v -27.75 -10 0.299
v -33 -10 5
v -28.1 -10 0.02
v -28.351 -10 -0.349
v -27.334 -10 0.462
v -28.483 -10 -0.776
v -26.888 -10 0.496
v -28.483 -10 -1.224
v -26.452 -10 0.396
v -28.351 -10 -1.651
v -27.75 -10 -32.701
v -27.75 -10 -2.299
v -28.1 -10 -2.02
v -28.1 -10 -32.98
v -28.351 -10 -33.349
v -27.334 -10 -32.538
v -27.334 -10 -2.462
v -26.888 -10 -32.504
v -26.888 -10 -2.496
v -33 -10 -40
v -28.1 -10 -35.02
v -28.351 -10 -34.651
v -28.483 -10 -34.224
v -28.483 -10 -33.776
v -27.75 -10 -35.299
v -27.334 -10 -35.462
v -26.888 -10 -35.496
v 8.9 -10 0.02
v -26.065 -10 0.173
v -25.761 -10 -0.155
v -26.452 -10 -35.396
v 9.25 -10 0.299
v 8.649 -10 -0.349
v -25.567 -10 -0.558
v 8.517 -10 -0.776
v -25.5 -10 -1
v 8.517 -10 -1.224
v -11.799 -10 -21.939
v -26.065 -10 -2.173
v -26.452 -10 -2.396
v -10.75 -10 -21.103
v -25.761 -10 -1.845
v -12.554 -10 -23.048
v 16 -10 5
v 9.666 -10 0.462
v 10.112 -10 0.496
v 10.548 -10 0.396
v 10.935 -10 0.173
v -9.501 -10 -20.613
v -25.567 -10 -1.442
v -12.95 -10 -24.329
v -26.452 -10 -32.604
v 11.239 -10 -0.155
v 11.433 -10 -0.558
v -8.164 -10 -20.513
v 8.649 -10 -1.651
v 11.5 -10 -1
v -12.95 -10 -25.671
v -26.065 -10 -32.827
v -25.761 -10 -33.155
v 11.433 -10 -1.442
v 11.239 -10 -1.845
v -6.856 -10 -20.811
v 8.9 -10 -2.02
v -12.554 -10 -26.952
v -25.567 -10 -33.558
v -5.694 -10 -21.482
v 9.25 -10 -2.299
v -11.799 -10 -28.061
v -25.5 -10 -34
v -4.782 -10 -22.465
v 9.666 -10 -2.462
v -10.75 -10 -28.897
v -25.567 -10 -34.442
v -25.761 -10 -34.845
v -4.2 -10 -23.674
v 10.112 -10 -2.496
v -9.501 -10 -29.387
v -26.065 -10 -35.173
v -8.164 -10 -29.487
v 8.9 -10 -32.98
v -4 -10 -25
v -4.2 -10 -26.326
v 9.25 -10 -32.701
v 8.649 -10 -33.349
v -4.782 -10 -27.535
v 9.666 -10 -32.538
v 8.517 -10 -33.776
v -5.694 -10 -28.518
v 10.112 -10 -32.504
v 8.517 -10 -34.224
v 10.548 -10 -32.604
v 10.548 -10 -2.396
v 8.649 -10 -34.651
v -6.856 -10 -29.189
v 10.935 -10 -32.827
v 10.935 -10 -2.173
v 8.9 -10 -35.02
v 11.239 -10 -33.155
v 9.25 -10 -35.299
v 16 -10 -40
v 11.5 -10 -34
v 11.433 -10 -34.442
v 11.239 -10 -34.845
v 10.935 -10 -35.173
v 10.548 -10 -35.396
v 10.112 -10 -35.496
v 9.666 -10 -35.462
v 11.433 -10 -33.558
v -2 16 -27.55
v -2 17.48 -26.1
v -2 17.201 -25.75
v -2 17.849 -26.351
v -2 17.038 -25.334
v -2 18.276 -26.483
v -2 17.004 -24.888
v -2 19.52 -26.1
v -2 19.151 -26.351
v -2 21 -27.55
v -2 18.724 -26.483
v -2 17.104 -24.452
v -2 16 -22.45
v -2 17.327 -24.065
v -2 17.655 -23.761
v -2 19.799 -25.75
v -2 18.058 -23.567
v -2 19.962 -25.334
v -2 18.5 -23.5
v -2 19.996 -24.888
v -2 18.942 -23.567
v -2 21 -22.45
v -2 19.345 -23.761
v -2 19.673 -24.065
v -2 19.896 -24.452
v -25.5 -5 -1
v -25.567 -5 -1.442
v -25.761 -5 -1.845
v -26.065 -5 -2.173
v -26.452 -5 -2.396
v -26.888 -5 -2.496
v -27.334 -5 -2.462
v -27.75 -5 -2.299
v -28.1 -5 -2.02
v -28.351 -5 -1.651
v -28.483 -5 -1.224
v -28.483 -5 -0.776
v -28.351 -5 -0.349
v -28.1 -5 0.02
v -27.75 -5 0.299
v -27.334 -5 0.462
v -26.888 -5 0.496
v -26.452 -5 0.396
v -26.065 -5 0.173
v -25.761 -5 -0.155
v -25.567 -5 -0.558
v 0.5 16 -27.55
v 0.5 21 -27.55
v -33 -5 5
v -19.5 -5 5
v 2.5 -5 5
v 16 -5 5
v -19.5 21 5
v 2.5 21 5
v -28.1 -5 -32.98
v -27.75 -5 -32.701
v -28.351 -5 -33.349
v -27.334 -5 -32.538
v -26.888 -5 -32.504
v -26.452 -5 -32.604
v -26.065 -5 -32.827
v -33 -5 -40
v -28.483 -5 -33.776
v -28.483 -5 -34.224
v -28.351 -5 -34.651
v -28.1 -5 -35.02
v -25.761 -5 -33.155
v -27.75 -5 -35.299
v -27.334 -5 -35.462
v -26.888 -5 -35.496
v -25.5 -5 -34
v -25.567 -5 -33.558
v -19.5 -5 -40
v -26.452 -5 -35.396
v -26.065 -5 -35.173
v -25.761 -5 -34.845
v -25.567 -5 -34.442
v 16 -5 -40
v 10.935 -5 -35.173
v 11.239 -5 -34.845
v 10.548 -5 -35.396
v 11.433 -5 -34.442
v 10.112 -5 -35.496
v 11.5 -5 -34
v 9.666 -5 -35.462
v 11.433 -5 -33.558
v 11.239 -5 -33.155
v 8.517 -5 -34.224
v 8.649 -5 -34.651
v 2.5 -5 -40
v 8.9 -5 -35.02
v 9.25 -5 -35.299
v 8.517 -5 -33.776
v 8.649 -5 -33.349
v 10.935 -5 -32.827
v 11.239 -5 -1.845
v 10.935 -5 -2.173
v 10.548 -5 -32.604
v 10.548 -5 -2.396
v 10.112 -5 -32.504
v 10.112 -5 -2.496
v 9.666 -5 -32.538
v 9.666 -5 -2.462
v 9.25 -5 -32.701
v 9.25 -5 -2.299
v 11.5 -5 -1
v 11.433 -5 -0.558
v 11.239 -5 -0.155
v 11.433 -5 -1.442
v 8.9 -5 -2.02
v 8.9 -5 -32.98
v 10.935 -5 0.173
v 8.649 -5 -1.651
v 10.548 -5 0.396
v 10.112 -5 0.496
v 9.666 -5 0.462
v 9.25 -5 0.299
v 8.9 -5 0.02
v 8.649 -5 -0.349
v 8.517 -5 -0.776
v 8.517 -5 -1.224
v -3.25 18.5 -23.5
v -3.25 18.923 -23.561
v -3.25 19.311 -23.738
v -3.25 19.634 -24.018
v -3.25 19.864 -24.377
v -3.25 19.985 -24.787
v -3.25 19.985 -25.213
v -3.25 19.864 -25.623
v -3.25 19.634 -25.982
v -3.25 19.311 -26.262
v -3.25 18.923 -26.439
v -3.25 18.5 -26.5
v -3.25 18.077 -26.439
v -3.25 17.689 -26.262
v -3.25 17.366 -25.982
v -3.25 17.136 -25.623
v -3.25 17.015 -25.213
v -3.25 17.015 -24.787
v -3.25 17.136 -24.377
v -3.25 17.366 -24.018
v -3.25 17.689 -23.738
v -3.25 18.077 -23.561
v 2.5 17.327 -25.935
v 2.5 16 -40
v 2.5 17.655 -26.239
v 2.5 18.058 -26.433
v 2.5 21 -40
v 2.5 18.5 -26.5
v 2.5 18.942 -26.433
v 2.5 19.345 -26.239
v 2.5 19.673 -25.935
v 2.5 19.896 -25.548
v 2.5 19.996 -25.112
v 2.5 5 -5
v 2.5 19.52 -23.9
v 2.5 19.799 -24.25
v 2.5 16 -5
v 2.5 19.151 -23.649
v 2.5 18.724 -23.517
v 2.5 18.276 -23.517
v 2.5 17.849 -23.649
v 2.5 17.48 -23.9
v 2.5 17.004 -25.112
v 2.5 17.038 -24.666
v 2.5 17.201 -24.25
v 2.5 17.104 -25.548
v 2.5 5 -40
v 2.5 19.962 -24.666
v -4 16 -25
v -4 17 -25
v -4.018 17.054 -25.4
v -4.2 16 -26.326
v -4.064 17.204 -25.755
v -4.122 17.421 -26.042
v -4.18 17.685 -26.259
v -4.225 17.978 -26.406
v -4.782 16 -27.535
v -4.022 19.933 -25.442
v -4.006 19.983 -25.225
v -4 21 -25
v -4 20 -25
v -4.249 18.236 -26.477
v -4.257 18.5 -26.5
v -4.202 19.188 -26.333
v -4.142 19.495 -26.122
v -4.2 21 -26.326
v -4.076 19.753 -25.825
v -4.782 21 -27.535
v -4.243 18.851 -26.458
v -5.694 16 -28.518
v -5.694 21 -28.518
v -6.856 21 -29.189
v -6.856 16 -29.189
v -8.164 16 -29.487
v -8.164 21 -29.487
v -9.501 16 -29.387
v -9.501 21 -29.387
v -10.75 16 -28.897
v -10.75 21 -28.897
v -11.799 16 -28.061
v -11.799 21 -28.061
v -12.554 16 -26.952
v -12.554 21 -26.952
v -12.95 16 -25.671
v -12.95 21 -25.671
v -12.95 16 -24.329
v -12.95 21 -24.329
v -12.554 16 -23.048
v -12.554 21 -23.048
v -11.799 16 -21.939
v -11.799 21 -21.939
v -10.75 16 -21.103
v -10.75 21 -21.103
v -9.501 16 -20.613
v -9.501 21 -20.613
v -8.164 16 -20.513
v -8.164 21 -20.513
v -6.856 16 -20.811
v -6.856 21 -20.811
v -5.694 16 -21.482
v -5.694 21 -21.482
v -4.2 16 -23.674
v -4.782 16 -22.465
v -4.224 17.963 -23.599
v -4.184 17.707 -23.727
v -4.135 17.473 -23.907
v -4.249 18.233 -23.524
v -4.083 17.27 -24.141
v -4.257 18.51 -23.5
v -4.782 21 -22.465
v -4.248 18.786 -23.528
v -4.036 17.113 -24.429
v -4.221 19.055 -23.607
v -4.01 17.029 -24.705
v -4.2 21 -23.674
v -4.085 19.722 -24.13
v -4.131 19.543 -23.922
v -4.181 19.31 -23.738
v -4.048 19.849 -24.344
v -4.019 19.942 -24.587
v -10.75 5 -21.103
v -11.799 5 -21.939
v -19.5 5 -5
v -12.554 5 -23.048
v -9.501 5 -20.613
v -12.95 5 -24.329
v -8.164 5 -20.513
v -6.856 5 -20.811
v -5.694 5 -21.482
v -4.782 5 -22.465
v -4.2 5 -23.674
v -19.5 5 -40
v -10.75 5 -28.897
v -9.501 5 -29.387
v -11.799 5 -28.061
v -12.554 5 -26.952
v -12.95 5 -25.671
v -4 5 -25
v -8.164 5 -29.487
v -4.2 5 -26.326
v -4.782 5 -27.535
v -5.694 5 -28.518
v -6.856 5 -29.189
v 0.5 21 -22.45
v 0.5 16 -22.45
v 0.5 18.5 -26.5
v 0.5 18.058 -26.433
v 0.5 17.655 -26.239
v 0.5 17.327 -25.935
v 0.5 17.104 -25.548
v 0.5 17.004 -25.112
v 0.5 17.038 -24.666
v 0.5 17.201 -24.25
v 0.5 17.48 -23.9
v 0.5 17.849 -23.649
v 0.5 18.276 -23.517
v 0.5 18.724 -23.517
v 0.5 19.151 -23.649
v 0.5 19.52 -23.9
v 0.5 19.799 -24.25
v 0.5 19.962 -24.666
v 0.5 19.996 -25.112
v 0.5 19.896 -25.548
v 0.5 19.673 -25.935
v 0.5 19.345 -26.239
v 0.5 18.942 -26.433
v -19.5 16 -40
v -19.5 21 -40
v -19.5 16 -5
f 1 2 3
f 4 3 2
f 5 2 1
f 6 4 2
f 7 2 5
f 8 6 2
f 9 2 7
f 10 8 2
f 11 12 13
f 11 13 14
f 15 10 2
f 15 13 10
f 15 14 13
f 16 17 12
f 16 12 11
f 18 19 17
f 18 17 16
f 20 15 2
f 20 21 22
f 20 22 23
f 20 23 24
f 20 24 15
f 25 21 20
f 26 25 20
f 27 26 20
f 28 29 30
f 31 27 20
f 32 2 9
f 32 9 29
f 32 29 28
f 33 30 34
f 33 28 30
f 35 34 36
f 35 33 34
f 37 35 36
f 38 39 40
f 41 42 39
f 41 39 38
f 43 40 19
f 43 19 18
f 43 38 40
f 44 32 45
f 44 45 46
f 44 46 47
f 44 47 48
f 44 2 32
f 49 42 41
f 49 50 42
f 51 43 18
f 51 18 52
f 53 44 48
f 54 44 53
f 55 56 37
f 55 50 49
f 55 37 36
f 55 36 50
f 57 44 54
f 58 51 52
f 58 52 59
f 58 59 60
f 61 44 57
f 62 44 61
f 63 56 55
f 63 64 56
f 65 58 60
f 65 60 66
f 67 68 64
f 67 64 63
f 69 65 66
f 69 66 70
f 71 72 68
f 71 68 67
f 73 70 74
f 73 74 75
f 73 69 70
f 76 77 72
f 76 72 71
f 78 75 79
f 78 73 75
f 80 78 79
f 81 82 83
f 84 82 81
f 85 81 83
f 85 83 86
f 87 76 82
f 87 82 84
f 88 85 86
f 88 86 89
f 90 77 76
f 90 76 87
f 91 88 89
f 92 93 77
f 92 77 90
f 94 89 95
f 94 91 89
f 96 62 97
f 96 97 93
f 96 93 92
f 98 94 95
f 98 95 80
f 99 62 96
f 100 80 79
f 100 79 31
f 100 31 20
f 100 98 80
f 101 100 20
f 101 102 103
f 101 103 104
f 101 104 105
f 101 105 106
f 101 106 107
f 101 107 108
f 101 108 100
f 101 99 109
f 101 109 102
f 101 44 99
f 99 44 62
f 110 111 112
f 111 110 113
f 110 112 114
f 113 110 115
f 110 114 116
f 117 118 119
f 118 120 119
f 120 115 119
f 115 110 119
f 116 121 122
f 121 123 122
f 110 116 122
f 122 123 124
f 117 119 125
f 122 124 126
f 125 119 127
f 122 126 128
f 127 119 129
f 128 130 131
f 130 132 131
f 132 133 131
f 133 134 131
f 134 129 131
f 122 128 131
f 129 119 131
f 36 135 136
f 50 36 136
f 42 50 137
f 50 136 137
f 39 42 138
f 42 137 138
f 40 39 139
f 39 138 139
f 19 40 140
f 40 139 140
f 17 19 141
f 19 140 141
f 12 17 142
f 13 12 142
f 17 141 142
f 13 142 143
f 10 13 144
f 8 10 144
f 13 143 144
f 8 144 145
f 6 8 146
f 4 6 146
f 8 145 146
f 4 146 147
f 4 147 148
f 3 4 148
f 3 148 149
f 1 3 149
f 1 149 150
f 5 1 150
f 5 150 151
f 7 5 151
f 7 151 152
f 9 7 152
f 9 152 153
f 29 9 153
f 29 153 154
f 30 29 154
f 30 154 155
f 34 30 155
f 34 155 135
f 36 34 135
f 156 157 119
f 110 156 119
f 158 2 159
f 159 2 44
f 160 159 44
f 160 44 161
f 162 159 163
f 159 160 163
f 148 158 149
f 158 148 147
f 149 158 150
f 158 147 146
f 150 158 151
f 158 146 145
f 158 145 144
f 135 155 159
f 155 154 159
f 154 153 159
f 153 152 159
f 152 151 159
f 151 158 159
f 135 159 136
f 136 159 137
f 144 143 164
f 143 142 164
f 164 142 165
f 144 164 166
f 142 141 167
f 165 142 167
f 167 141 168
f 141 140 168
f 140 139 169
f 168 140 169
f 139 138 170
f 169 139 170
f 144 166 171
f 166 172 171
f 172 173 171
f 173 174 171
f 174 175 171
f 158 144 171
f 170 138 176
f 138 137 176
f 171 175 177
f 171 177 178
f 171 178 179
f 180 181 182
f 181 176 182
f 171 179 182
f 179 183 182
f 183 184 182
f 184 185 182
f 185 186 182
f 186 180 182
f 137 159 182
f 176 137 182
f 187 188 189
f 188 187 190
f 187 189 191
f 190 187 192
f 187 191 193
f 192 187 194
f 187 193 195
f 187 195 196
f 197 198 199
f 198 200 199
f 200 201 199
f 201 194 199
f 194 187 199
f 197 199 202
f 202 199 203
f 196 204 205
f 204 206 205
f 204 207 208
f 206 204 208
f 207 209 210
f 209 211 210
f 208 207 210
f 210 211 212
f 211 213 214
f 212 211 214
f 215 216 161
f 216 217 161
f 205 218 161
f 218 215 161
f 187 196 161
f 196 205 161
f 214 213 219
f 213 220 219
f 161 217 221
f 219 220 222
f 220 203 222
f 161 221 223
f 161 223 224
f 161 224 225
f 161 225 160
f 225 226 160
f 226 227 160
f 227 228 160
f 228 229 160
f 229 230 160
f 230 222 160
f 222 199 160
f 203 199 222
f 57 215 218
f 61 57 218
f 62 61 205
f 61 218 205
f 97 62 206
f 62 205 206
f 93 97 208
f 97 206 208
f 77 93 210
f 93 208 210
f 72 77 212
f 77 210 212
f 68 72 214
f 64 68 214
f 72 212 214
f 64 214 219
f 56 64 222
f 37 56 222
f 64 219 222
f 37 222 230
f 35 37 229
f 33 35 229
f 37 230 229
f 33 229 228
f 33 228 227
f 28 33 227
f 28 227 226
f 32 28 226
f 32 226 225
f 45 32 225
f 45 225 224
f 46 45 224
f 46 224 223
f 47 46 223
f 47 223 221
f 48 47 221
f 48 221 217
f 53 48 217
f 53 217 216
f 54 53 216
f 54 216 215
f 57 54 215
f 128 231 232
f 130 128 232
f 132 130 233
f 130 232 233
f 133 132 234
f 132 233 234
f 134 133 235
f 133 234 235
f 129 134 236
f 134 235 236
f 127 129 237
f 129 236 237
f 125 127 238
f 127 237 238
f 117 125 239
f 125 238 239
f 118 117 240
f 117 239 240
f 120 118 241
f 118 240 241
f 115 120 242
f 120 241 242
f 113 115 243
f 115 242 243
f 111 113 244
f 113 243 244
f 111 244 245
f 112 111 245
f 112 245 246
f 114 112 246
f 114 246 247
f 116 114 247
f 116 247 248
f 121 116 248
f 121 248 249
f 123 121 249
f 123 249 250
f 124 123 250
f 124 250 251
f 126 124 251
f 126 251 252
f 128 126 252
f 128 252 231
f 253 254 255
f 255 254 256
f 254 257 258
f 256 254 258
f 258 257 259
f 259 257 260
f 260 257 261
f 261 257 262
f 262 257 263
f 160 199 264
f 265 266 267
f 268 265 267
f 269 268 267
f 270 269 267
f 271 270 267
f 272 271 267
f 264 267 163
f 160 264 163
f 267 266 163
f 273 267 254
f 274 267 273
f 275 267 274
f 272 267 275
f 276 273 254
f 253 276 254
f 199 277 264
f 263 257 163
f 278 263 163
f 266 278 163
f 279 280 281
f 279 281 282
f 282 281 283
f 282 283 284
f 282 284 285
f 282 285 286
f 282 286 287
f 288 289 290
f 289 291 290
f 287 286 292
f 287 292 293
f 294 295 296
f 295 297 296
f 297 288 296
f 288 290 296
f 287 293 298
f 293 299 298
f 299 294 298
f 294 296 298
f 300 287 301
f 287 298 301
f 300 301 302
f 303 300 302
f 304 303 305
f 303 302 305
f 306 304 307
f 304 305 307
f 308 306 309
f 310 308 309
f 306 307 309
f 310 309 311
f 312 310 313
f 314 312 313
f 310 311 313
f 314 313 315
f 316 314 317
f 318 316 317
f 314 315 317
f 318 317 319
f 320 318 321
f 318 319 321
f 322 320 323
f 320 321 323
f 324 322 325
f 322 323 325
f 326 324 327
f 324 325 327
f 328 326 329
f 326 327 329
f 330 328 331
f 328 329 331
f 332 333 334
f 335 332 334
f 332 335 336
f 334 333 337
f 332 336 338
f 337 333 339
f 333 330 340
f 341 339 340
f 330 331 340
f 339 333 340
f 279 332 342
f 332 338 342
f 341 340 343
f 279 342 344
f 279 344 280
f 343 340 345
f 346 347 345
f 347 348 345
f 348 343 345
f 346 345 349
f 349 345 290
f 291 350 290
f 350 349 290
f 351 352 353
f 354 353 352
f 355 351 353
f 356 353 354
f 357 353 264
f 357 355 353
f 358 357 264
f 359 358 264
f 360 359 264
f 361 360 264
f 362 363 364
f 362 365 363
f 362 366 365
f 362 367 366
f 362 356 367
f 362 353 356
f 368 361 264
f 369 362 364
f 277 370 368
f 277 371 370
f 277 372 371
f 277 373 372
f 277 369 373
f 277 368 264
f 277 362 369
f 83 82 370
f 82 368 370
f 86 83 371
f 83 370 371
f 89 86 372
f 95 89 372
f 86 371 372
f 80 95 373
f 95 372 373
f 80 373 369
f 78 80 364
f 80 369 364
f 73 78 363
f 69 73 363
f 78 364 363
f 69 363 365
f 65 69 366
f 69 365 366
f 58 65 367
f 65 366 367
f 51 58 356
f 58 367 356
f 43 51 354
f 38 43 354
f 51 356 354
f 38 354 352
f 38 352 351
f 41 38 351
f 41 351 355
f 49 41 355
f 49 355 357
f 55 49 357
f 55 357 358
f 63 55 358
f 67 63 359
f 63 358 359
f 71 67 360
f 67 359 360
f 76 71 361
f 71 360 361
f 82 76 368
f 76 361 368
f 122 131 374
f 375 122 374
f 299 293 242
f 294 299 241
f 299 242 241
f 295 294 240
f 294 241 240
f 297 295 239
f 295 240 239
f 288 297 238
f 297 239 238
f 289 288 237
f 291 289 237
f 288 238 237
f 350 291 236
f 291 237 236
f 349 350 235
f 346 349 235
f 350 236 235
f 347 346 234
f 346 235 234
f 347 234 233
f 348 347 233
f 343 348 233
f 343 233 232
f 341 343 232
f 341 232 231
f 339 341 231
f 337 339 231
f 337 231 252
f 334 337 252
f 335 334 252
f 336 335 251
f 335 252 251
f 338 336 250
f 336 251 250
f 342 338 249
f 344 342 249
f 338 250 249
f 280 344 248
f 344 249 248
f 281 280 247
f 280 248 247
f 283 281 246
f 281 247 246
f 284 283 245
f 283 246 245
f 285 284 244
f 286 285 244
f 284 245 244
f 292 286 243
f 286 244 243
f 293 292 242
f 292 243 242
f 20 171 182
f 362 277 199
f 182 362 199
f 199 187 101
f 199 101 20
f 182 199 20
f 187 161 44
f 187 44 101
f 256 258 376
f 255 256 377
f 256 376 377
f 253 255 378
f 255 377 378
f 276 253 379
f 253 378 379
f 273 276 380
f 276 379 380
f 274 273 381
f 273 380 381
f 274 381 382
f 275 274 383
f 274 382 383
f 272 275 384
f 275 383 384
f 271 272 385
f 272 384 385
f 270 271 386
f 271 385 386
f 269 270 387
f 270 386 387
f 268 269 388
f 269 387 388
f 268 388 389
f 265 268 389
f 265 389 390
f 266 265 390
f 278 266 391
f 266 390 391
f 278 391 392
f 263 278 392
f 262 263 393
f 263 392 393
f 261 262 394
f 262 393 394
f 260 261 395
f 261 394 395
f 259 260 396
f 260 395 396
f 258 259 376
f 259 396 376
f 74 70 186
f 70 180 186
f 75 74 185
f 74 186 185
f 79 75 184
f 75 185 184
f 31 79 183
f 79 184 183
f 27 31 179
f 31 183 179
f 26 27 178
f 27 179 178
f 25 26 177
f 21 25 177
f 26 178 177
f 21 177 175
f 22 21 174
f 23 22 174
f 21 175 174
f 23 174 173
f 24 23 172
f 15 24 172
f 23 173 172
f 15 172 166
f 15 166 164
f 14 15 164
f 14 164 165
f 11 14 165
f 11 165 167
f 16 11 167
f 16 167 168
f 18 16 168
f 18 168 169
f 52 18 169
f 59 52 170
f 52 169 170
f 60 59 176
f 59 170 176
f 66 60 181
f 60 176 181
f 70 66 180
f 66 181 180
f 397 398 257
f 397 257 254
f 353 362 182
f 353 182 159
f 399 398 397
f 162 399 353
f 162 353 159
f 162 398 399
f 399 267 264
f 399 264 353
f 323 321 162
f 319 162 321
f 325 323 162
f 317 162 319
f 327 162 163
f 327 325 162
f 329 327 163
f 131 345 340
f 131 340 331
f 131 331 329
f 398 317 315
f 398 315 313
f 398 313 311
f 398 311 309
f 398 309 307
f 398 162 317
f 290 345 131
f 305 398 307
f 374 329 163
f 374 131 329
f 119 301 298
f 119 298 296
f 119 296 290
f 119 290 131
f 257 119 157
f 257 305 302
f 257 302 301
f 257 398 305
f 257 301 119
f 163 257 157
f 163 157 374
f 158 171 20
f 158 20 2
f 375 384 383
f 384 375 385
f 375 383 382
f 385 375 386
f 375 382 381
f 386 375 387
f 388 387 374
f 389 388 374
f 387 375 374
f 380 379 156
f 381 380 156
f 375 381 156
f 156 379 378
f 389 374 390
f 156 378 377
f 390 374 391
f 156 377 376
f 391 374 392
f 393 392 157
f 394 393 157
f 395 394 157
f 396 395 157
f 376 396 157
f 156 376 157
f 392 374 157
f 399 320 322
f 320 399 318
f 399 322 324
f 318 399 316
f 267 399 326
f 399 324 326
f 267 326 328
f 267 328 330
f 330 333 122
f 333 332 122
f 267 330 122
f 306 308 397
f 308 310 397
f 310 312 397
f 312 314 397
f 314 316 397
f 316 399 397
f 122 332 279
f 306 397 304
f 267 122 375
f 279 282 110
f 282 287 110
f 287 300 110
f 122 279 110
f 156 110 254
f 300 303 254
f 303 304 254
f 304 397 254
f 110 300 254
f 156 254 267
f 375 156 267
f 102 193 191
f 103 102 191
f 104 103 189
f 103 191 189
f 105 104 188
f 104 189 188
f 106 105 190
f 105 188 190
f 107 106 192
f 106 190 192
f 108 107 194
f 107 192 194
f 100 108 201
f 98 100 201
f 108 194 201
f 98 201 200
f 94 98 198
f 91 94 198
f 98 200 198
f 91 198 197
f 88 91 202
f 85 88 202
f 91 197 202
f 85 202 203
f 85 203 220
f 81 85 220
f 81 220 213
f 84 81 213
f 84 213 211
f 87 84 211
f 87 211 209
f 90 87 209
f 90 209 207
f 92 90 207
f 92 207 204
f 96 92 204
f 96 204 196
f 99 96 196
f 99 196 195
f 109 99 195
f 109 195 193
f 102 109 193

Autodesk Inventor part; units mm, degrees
ref_plane "YZ Plane" through (0, 0, 0) normal (1, 0, 0) x (0, 1, 0)
ref_plane "XZ Plane" through (0, 0, 0) normal (0, 1, 0) x (-1, 0, 0)
ref_plane "XY Plane" through (0, 0, 0) normal (0, 0, 1) x (1, 0, 0)
sketch "Skizze1" plane through (0, 0, 0) normal (0, 1, 0) x (-1, 0, 0)
  line L0 (0, 0) -> (17, 0)
  line L1 (17, 0) -> (17, -40)
  line L2 (17, -40) -> (0, -40)
  line L3 (0, -40) -> (0, 0)
  dimension "d0" = 17
  dimension "d1" = 40
extrude "Extrusion1" add sketch "Skizze1" along normal blind 5
sketch "Skizze2" plane through (0, 5, 0) normal (0, 1, 0) x (1, 0, 0)
  line L0 (-17, 0) -> (0, 0) projected
  line L1 (0, 0) -> (0, 40) projected
  line L2 (-17, 0) -> (0, 0)
  line L3 (0, 0) -> (0, 10)
  line L4 (0, 10) -> (-17, 10)
  line L5 (-17, 10) -> (-17, 0)
  dimension "d4" = 10
extrude "Extrusion2" add sketch "Skizze2" along normal blind 11
sketch "Skizze3" plane through (0, 16, 0) normal (0, 1, 0) x (1, 0, 0)
  line L0 (-17, 0) -> (0, 0) projected
  line L1 (0, 0) -> (0, 40) projected
  line L2 (-17, 0) -> (0, 0)
  line L3 (0, 0) -> (0, 40)
  line L4 (0, 40) -> (-17, 40)
  line L5 (-17, 40) -> (-17, 0)
  dimension "d7" = 17
  dimension "d8" = 40
extrude "Extrusion3" add sketch "Skizze3" along normal blind 5
sketch "Skizze4" plane through (0, 21, 0) normal (0, 1, 0) x (1, 0, 0)
  line L0 (0, 10) -> (0, 40) projected
  line L1 (0, 40) -> (-8.5, 40)
  line L2 (-8.5, 40) -> (-8.5, 25)
  line L3 (-8.5, 25) -> (0, 25)
  line L4 (0, 25) -> (0, 40)
  circle A0 centre (-8.5, 25) radius 4.5
  point P0 (0, 0)
  dimension "d11" = 8.5
  dimension "d12" = 15
  dimension "d13" = 9
extrude "Extrusion4" cut sketch "Skizze4" against normal blind 21 contours A0 L2 L3 | L3 L2 A0
sketch "Skizze5" plane through (0, 21, 0) normal (0, 1, 0) x (1, 0, 0)
  circle A0 centre (-8.5, 25) radius 4.5 projected
  line L0 (-8.5, 25) -> (0, 25)
  line L1 (0, 0) -> (0, 40) projected
  line L2 (0, 25) -> (-2, 25)
  line L3 (-2, 25) -> (-3.25, 25)
  line L4 (-3.25, 25) -> (-3.25, 27.55)
  line L5 (-3.25, 27.55) -> (-0.75, 27.55)
  line L6 (-0.75, 27.55) -> (-0.75, 22.45)
  line L7 (-0.75, 22.45) -> (-3.25, 22.45)
  line L8 (-3.25, 22.45) -> (-3.25, 25)
  dimension "d16" = 2
  dimension "d17" = 1.25
  dimension "d18" = 2.55
  dimension "d19" = 2.5
  dimension "d20" = 5.1
extrude "Extrusion5" cut sketch "Skizze5" against normal blind 5 contours L4 L5 L6 L0 | L0 L6 L7 L8
sketch "Skizze6" plane through (0, 5, 0) normal (0, 1, 0) x (1, 0, 0)
  point P0 (0, 0)
sketch "Skizze7" plane through (0, 21, 0) normal (0, 1, 0) x (1, 0, 0)
  point P0 (0, 0)
sketch "Skizze8" plane through (0, 0, 0) normal (1, 0, 0) x (0, 0, -1)
  line L0 (40, 16) -> (40, 21) projected
  line L1 (40, 20.3408) -> (25, 20.3408)
  line L2 (40, 20.3408) -> (55, 20.3408) construction
  line L3 (25, 20.3408) -> (25, 21)
  line L4 (27.55, 21) -> (22.45, 21) projected
  line L5 (25, 21) -> (25, 18.5)
  circle A0 centre (25, 18.5) radius 1.5
  point P0 (0, 0)
  dimension "d23" = 15
  dimension "d24" = 180
  dimension "d25" = 2.5
  dimension "d26" = 3
extrude "Extrusion6" cut sketch "Skizze8" against normal blind 10
sketch "Skizze9" plane through (0, 21, 0) normal (0, 1, 0) x (1, 0, 0)
  point P0 (0, 0)
sketch "Skizze10" plane through (0, 21, 0) normal (0, 1, 0) x (1, 0, 0)
  point P0 (0, 0)
sketch "Skizze11" plane through (0, 5, 0) normal (0, 1, 0) x (1, 0, 0)
  point P0 (0, 0)
sketch "Skizze12" plane through (-17, 0, -40) normal (-1, 0, 0) x (0, 0, 1)
  line L0 (40, 21) -> (0, 21) projected
  line L1 (40, 0) -> (0, 0) projected
  line L2 (40, 21) -> (30, 21)
  line L3 (30, 0) -> (40, 0)
  line L4 (40, 0) -> (40, 21)
  line L5 (30, 16) -> (0, 16) projected
  line L6 (30, 21) -> (0, 21)
  line L7 (0, 21) -> (0, 16)
  line L8 (0, 16) -> (30, 16)
  line L9 (30, 5) -> (30, 16) projected
  line L10 (30, 5) -> (0, 5)
  line L11 (0, 5) -> (0, 0)
  line L12 (0, 0) -> (30, 0)
  line L13 (30, 16) -> (30, 5)
  dimension "d29" = 10
extrude "Extrusion7" add sketch "Skizze12" along normal blind 2.5
sketch "Skizze13" plane through (0, 0, 0) normal (1, 0, 0) x (0, 0, -1)
  line L0 (0, 0) -> (40, 0) projected
  line L1 (10, 5) -> (40, 5) projected
  line L2 (40, 0) -> (10, 0)
  line L3 (10, 5) -> (40, 5)
  line L4 (40, 5) -> (40, 0)
  line L5 (0, 0) -> (0, 21) projected
  line L6 (10, 0) -> (0, 0)
  line L7 (0, 0) -> (0, 21)
  line L8 (0, 21) -> (10, 21)
  line L9 (10, 16) -> (40, 16) projected
  line L10 (40, 16) -> (10, 16)
  line L11 (10, 21) -> (40, 21)
  line L12 (40, 21) -> (40, 16)
  line L13 (10, 5) -> (10, 16) projected
  line L14 (10, 5) -> (10, 16)
  circle A0 centre (25, 18.5) radius 1.5 projected
  circle A1 centre (25, 18.5) radius 1.5
  dimension "d32" = 3
extrude "Extrusion8" add sketch "Skizze13" along normal blind 2.5
sketch "Skizze14" plane through (0, 21, 0) normal (0, 1, 0) x (1, 0, 0)
  line L0 (-0.75, 27.55) -> (-3.25, 27.55) projected
  line L1 (-3.25, 22.45) -> (-3.25, 27.55) projected
  line L2 (-0.75, 27.55) -> (-3.25, 27.55)
  line L3 (-3.25, 27.55) -> (-3.25, 22.45)
  line L4 (-3.25, 22.45) -> (-0.75, 22.45)
  line L5 (-0.75, 22.45) -> (-0.75, 27.55)
  point P0 (0, 0)
extrude "Extrusion9" add sketch "Skizze14" against normal blind 5
sketch "Skizze15" plane through (0, 21, 0) normal (0, 1, 0) x (1, 0, 0)
  circle A0 centre (-8.5, 25) radius 4.5 projected
  line L0 (-8.5, 25) -> (2.5, 25)
  line L1 (2.5, 26.5) -> (2.5, 23.5) projected
  line L2 (2.5, 25) -> (-4, 25)
  line L3 (2.5, 25) -> (-0.75, 25)
  line L4 (-0.75, 25) -> (-2, 25)
  line L5 (-2, 25) -> (-2, 22.45)
  line L6 (-2, 22.45) -> (0.5, 22.45)
  line L7 (0.5, 22.45) -> (0.5, 27.55)
  line L8 (0.5, 27.55) -> (-2, 27.55)
  line L9 (0.5, 27.55) -> (3, 27.55) construction
  line L10 (-2, 27.55) -> (-2, 25)
  point P0 (0, 0)
  dimension "d37" = 3.25
  dimension "d38" = 1.25
  dimension "d39" = 2.55
  dimension "d40" = 90
  dimension "d41" = 2.5
  dimension "d42" = 90
  dimension "d43" = 5.1
  dimension "d44" = 90
  dimension "d45" = 2.5
  dimension "d46" = 180
sketch "Skizze16" plane through (0, 21, 0) normal (0, 1, 0) x (1, 0, 0)
  point P0 (0, 0)
extrude "Extrusion10" cut sketch "Skizze15" against normal blind 5 contours L10 L8 L7 L0 | L0 L7 L6 L5
sketch "Skizze17" plane through (2.5, 0, 0) normal (1, 0, 0) x (0, 0, -1)
  circle A0 centre (25, 18.5) radius 1.5 projected
  circle A1 centre (25, 18.5) radius 1.5
  point P0 (0, 0)
  dimension "d49" = 3
sketch "Skizze18" plane through (-3.25, 18.5, -25) normal (-1, 0, 0) x (0, 0, 1)
  circle A0 centre (0, 0) radius 1.5
  point P0 (25, -18.5)
  dimension "d50" = 3
extrude "Extrusion11" cut sketch "Skizze18" against normal blind 8
sketch "Skizze19" plane through (-19.5, 0, 0) normal (0, 0, 1) x (1, 0, 0)
  line L0 (22, 0) -> (0, 0) projected
  line L1 (0, 21) -> (0, 16) projected
  line L2 (22, 0) -> (0, 0)
  line L3 (0, 0) -> (0, 21)
  line L4 (0, 21) -> (22, 21)
  line L5 (22, 21) -> (22, 0)
  point P0 (19.5, 0)
extrude "Extrusion12" add sketch "Skizze19" along normal blind 5
sketch "Skizze20" plane through (-19.5, 5, -10) normal (0, 0, -1) x (-1, 0, 0)
  line L0 (0, 11) -> (0, 0) projected
  line L1 (0, 11) -> (-22, 11) projected
  line L2 (0, 0) -> (-22, 0)
  line L3 (-22, 0) -> (-22, 11)
  line L4 (-22, 11) -> (0, 11)
  line L5 (0, 11) -> (0, 0)
  point P0 (-19.5, -5)
extrude "Extrusion13" cut sketch "Skizze20" against normal blind 5
sketch "Skizze21" plane through (-19.5, 0, -40) normal (-1, 0, 0) x (0, 0, 1)
  line L0 (0, 0) -> (45, 0) projected
  line L1 (0, 5) -> (45, 5)
  line L2 (45, 5) -> (45, 0)
  line L3 (45, 0) -> (0, 0)
  line L4 (0, 0) -> (0, 5)
  point P0 (40, 0)
extrude "Extrusion14" add sketch "Skizze21" along normal blind 13.5
sketch "Skizze22" plane through (2.5, 0, 0) normal (1, 0, 0) x (0, 0, -1)
  line L0 (40, 0) -> (-5, 0) projected
  line L1 (40, 5) -> (5, 5) projected
  line L2 (-5, 0) -> (40, 0)
  line L3 (40, 0) -> (40, 5)
  line L4 (40, 5) -> (-5, 5)
  line L5 (-5, 5) -> (-5, 0)
  point P0 (0, 0)
extrude "Extrusion15" add sketch "Skizze22" along normal blind 13.5
sketch "Skizze23" plane through (0, 5, 0) normal (0, 1, 0) x (1, 0, 0)
  line L0 (16, 40) -> (10, 40)
  line L1 (10, 40) -> (10, 34)
  line L2 (10, 34) -> (16, 34)
  line L3 (16, 34) -> (16, 40)
  circle A0 centre (10, 34) radius 1.5
  point P0 (0, 0)
  dimension "d61" = 6
  dimension "d62" = 6
  dimension "d63" = 3
extrude "Extrusion16" cut sketch "Skizze23" against normal blind 13.5 contours A0 L2 L1 | L1 L2 A0
sketch "Skizze24" plane through (0, 5, 0) normal (0, 1, 0) x (1, 0, 0)
  line L0 (16, -5) -> (16, 40) projected
  line L1 (16, -5) -> (10, -5)
  line L2 (10, -5) -> (10, 1)
  line L3 (10, 1) -> (16, 1)
  line L4 (16, 1) -> (16, -5)
  circle A0 centre (10, 1) radius 1.5
  point P0 (0, 0)
  dimension "d66" = 6
  dimension "d67" = 6
  dimension "d68" = 3
extrude "Extrusion17" cut sketch "Skizze24" against normal blind 13.5 contours A0 L2 L3 | L3 L2 A0
sketch "Skizze25" plane through (0, 5, 0) normal (0, 1, 0) x (1, 0, 0)
  line L0 (-33, 40) -> (-33, -5) projected
  line L1 (-33, 40) -> (-27, 40)
  line L2 (-27, 40) -> (-27, 34)
  line L3 (-27, 34) -> (-33, 34)
  line L4 (-33, 34) -> (-33, 40)
  circle A0 centre (-27, 34) radius 1.5
  point P0 (0, 0)
  dimension "d71" = 6
  dimension "d72" = 6
  dimension "d73" = 3
extrude "Extrusion18" cut sketch "Skizze25" against normal blind 13.5 contours A0 L2 L3 | L3 L2 A0
sketch "Skizze26" plane through (0, 5, 0) normal (0, 1, 0) x (1, 0, 0)
  line L0 (16, -5) -> (-33, -5) projected
  line L1 (-33, -5) -> (-27, -5)
  line L2 (-27, -5) -> (-27, 1)
  line L3 (-27, 1) -> (-33, 1)
  line L4 (-33, 1) -> (-33, -5)
  circle A0 centre (-27, 1) radius 1.5
  point P0 (0, 0)
  dimension "d76" = 6
  dimension "d77" = 6
  dimension "d78" = 3
extrude "Extrusion19" cut sketch "Skizze26" against normal blind 13.5 contours A0 L3 L2 | L2 L3 A0
sketch "Skizze27" plane through (0, 5, 0) normal (0, 1, 0) x (1, 0, 0)
  line L0 (2.5, -5) -> (16, -5) projected
  line L1 (16, 40) -> (16, -5) projected
  line L2 (2.5, -5) -> (16, -5)
  line L3 (16, -5) -> (16, 40)
  line L4 (16, 40) -> (2.5, 40)
  line L5 (2.5, 40) -> (2.5, -5)
  point P0 (0, 0)
extrude "Extrusion20" cut sketch "Skizze27" against normal blind 10
sketch "Skizze28" plane through (0, 5, 0) normal (0, 1, 0) x (1, 0, 0)
  line L0 (-19.5, 5) -> (-19.5, -5) projected
  line L1 (-33, -5) -> (-33, 40) projected
  line L2 (-19.5, -5) -> (-33, -5)
  line L3 (-33, -5) -> (-33, 40)
  line L4 (-33, 40) -> (-19.5, 40)
  line L5 (-19.5, 40) -> (-19.5, -5)
  point P0 (0, 0)
extrude "Extrusion21" cut sketch "Skizze28" against normal blind 10
sketch "Skizze29" plane through (0, 0, 0) normal (0, -1, 0) x (1, 0, 0)
  line L0 (2.5, 5) -> (-19.5, 5) projected
  line L1 (-19.5, -40) -> (-19.5, -5) projected
  line L2 (2.5, 5) -> (-19.5, 5)
  line L3 (-19.5, 5) -> (-19.5, -40)
  line L4 (-19.5, -40) -> (2.5, -40)
  line L5 (2.5, -40) -> (2.5, 5)
  point P0 (0, 0)
extrude "Extrusion22" add sketch "Skizze29" along normal blind 10
sketch "Skizze30" plane through (0, 5, 0) normal (0, 1, 0) x (1, 0, 0)
  circle A0 centre (-8.5, 25) radius 4.5 projected
  circle A1 centre (-8.5, 25) radius 4.5
  point P0 (0, 0)
  dimension "d87" = 9
extrude "Extrusion23" add sketch "Skizze30" against normal blind 5
extrude "Extrusion24" cut sketch "Skizze30" against normal blind 15
sketch "Skizze31" plane through (2.5, 5, -40) normal (0, 0, -1) x (-1, 0, 0)
  point P0 (2.5, -5)
sketch "Skizze32" plane through (2.5, 0, 0) normal (1, 0, 0) x (0, 0, -1)
  line L0 (-5, -10) -> (-5, 21) projected
  line L1 (-5, -10) -> (40, -10)
  line L2 (40, -10) -> (40, -5)
  line L3 (40, -5) -> (-5, -5)
  line L4 (-5, -5) -> (-5, -10)
  point P0 (0, 0)
  dimension "d92" = 45
  dimension "d93" = 5
extrude "Extrusion25" add sketch "Skizze32" along normal blind 13.5
sketch "Skizze33" plane through (-19.5, 0, -40) normal (-1, 0, 0) x (0, 0, 1)
  line L0 (45, -10) -> (0, -10) projected
  line L1 (0, -10) -> (45, -10)
  line L2 (45, -10) -> (45, -5)
  line L3 (45, -5) -> (0, -5)
  line L4 (0, -5) -> (0, -10)
  point P0 (40, 0)
  dimension "d96" = 45
  dimension "d97" = 5
extrude "Extrusion26" add sketch "Skizze33" along normal blind 13.5
sketch "Skizze34" plane through (-19.5, -5, 5) normal (0, 1, 0) x (1, 0, 0)
  line L0 (35.5, 45) -> (-13.5, 45) projected
  line L1 (-13.5, 45) -> (-7.5, 45)
  line L2 (-7.5, 45) -> (-7.5, 39)
  line L3 (-7.5, 39) -> (-13.5, 39)
  line L4 (-13.5, 39) -> (-13.5, 45)
  circle A0 centre (-7.5, 39) radius 1.5
  point P0 (19.5, 5)
  dimension "d100" = 6
  dimension "d101" = 6
  dimension "d102" = 3
extrude "Extrusion27" cut sketch "Skizze34" against normal blind 5 contours A0 L3 L2 | L2 L3 A0
sketch "Skizze35" plane through (-19.5, -5, 5) normal (0, 1, 0) x (1, 0, 0)
  line L0 (0, 0) -> (-13.5, 0) projected
  line L1 (-13.5, 0) -> (-7.5, 0)
  line L2 (-7.5, 0) -> (-7.5, 6)
  line L3 (-7.5, 6) -> (-13.5, 6)
  line L4 (-13.5, 6) -> (-13.5, 0)
  circle A0 centre (-7.5, 6) radius 1.5
  point P0 (19.5, 5)
  dimension "d105" = 6
  dimension "d106" = 6
  dimension "d107" = 3
extrude "Extrusion28" cut sketch "Skizze35" against normal blind 5 contours A0 L3 L2 | L2 L3 A0
sketch "Skizze36" plane through (2.5, -5, 5) normal (0, 1, 0) x (1, 0, 0)
  line L0 (13.5, 0) -> (13.5, 45) projected
  line L1 (13.5, 45) -> (7.5, 45)
  line L2 (7.5, 45) -> (7.5, 39)
  line L3 (7.5, 39) -> (13.5, 39)
  line L4 (13.5, 39) -> (13.5, 45)
  circle A0 centre (7.5, 39) radius 1.5
  point P0 (-2.5, 5)
  dimension "d110" = 6
  dimension "d111" = 6
  dimension "d112" = 3
sketch "Skizze37" plane through (2.5, -5, 5) normal (0, 1, 0) x (1, 0, 0)
  point P0 (-2.5, 5)
extrude "Extrusion29" cut sketch "Skizze36" against normal blind 5 contours A0 L2 L3 | L3 L2 A0
sketch "Skizze38" plane through (2.5, -5, 5) normal (0, 1, 0) x (1, 0, 0)
  line L0 (13.5, 0) -> (13.5, 45) projected
  line L1 (13.5, 0) -> (7.5, 0)
  line L2 (7.5, 0) -> (7.5, 6)
  line L3 (7.5, 6) -> (13.5, 6)
  line L4 (13.5, 6) -> (13.5, 0)
  circle A0 centre (7.5, 6) radius 1.5
  point P0 (-2.5, 5)
  dimension "d115" = 6
  dimension "d116" = 6
  dimension "d117" = 3
extrude "Extrusion30" cut sketch "Skizze38" against normal blind 5 contours A0 L2 L3 | L3 L2 A0
properties part number "HalterungRillenKugelLager"
